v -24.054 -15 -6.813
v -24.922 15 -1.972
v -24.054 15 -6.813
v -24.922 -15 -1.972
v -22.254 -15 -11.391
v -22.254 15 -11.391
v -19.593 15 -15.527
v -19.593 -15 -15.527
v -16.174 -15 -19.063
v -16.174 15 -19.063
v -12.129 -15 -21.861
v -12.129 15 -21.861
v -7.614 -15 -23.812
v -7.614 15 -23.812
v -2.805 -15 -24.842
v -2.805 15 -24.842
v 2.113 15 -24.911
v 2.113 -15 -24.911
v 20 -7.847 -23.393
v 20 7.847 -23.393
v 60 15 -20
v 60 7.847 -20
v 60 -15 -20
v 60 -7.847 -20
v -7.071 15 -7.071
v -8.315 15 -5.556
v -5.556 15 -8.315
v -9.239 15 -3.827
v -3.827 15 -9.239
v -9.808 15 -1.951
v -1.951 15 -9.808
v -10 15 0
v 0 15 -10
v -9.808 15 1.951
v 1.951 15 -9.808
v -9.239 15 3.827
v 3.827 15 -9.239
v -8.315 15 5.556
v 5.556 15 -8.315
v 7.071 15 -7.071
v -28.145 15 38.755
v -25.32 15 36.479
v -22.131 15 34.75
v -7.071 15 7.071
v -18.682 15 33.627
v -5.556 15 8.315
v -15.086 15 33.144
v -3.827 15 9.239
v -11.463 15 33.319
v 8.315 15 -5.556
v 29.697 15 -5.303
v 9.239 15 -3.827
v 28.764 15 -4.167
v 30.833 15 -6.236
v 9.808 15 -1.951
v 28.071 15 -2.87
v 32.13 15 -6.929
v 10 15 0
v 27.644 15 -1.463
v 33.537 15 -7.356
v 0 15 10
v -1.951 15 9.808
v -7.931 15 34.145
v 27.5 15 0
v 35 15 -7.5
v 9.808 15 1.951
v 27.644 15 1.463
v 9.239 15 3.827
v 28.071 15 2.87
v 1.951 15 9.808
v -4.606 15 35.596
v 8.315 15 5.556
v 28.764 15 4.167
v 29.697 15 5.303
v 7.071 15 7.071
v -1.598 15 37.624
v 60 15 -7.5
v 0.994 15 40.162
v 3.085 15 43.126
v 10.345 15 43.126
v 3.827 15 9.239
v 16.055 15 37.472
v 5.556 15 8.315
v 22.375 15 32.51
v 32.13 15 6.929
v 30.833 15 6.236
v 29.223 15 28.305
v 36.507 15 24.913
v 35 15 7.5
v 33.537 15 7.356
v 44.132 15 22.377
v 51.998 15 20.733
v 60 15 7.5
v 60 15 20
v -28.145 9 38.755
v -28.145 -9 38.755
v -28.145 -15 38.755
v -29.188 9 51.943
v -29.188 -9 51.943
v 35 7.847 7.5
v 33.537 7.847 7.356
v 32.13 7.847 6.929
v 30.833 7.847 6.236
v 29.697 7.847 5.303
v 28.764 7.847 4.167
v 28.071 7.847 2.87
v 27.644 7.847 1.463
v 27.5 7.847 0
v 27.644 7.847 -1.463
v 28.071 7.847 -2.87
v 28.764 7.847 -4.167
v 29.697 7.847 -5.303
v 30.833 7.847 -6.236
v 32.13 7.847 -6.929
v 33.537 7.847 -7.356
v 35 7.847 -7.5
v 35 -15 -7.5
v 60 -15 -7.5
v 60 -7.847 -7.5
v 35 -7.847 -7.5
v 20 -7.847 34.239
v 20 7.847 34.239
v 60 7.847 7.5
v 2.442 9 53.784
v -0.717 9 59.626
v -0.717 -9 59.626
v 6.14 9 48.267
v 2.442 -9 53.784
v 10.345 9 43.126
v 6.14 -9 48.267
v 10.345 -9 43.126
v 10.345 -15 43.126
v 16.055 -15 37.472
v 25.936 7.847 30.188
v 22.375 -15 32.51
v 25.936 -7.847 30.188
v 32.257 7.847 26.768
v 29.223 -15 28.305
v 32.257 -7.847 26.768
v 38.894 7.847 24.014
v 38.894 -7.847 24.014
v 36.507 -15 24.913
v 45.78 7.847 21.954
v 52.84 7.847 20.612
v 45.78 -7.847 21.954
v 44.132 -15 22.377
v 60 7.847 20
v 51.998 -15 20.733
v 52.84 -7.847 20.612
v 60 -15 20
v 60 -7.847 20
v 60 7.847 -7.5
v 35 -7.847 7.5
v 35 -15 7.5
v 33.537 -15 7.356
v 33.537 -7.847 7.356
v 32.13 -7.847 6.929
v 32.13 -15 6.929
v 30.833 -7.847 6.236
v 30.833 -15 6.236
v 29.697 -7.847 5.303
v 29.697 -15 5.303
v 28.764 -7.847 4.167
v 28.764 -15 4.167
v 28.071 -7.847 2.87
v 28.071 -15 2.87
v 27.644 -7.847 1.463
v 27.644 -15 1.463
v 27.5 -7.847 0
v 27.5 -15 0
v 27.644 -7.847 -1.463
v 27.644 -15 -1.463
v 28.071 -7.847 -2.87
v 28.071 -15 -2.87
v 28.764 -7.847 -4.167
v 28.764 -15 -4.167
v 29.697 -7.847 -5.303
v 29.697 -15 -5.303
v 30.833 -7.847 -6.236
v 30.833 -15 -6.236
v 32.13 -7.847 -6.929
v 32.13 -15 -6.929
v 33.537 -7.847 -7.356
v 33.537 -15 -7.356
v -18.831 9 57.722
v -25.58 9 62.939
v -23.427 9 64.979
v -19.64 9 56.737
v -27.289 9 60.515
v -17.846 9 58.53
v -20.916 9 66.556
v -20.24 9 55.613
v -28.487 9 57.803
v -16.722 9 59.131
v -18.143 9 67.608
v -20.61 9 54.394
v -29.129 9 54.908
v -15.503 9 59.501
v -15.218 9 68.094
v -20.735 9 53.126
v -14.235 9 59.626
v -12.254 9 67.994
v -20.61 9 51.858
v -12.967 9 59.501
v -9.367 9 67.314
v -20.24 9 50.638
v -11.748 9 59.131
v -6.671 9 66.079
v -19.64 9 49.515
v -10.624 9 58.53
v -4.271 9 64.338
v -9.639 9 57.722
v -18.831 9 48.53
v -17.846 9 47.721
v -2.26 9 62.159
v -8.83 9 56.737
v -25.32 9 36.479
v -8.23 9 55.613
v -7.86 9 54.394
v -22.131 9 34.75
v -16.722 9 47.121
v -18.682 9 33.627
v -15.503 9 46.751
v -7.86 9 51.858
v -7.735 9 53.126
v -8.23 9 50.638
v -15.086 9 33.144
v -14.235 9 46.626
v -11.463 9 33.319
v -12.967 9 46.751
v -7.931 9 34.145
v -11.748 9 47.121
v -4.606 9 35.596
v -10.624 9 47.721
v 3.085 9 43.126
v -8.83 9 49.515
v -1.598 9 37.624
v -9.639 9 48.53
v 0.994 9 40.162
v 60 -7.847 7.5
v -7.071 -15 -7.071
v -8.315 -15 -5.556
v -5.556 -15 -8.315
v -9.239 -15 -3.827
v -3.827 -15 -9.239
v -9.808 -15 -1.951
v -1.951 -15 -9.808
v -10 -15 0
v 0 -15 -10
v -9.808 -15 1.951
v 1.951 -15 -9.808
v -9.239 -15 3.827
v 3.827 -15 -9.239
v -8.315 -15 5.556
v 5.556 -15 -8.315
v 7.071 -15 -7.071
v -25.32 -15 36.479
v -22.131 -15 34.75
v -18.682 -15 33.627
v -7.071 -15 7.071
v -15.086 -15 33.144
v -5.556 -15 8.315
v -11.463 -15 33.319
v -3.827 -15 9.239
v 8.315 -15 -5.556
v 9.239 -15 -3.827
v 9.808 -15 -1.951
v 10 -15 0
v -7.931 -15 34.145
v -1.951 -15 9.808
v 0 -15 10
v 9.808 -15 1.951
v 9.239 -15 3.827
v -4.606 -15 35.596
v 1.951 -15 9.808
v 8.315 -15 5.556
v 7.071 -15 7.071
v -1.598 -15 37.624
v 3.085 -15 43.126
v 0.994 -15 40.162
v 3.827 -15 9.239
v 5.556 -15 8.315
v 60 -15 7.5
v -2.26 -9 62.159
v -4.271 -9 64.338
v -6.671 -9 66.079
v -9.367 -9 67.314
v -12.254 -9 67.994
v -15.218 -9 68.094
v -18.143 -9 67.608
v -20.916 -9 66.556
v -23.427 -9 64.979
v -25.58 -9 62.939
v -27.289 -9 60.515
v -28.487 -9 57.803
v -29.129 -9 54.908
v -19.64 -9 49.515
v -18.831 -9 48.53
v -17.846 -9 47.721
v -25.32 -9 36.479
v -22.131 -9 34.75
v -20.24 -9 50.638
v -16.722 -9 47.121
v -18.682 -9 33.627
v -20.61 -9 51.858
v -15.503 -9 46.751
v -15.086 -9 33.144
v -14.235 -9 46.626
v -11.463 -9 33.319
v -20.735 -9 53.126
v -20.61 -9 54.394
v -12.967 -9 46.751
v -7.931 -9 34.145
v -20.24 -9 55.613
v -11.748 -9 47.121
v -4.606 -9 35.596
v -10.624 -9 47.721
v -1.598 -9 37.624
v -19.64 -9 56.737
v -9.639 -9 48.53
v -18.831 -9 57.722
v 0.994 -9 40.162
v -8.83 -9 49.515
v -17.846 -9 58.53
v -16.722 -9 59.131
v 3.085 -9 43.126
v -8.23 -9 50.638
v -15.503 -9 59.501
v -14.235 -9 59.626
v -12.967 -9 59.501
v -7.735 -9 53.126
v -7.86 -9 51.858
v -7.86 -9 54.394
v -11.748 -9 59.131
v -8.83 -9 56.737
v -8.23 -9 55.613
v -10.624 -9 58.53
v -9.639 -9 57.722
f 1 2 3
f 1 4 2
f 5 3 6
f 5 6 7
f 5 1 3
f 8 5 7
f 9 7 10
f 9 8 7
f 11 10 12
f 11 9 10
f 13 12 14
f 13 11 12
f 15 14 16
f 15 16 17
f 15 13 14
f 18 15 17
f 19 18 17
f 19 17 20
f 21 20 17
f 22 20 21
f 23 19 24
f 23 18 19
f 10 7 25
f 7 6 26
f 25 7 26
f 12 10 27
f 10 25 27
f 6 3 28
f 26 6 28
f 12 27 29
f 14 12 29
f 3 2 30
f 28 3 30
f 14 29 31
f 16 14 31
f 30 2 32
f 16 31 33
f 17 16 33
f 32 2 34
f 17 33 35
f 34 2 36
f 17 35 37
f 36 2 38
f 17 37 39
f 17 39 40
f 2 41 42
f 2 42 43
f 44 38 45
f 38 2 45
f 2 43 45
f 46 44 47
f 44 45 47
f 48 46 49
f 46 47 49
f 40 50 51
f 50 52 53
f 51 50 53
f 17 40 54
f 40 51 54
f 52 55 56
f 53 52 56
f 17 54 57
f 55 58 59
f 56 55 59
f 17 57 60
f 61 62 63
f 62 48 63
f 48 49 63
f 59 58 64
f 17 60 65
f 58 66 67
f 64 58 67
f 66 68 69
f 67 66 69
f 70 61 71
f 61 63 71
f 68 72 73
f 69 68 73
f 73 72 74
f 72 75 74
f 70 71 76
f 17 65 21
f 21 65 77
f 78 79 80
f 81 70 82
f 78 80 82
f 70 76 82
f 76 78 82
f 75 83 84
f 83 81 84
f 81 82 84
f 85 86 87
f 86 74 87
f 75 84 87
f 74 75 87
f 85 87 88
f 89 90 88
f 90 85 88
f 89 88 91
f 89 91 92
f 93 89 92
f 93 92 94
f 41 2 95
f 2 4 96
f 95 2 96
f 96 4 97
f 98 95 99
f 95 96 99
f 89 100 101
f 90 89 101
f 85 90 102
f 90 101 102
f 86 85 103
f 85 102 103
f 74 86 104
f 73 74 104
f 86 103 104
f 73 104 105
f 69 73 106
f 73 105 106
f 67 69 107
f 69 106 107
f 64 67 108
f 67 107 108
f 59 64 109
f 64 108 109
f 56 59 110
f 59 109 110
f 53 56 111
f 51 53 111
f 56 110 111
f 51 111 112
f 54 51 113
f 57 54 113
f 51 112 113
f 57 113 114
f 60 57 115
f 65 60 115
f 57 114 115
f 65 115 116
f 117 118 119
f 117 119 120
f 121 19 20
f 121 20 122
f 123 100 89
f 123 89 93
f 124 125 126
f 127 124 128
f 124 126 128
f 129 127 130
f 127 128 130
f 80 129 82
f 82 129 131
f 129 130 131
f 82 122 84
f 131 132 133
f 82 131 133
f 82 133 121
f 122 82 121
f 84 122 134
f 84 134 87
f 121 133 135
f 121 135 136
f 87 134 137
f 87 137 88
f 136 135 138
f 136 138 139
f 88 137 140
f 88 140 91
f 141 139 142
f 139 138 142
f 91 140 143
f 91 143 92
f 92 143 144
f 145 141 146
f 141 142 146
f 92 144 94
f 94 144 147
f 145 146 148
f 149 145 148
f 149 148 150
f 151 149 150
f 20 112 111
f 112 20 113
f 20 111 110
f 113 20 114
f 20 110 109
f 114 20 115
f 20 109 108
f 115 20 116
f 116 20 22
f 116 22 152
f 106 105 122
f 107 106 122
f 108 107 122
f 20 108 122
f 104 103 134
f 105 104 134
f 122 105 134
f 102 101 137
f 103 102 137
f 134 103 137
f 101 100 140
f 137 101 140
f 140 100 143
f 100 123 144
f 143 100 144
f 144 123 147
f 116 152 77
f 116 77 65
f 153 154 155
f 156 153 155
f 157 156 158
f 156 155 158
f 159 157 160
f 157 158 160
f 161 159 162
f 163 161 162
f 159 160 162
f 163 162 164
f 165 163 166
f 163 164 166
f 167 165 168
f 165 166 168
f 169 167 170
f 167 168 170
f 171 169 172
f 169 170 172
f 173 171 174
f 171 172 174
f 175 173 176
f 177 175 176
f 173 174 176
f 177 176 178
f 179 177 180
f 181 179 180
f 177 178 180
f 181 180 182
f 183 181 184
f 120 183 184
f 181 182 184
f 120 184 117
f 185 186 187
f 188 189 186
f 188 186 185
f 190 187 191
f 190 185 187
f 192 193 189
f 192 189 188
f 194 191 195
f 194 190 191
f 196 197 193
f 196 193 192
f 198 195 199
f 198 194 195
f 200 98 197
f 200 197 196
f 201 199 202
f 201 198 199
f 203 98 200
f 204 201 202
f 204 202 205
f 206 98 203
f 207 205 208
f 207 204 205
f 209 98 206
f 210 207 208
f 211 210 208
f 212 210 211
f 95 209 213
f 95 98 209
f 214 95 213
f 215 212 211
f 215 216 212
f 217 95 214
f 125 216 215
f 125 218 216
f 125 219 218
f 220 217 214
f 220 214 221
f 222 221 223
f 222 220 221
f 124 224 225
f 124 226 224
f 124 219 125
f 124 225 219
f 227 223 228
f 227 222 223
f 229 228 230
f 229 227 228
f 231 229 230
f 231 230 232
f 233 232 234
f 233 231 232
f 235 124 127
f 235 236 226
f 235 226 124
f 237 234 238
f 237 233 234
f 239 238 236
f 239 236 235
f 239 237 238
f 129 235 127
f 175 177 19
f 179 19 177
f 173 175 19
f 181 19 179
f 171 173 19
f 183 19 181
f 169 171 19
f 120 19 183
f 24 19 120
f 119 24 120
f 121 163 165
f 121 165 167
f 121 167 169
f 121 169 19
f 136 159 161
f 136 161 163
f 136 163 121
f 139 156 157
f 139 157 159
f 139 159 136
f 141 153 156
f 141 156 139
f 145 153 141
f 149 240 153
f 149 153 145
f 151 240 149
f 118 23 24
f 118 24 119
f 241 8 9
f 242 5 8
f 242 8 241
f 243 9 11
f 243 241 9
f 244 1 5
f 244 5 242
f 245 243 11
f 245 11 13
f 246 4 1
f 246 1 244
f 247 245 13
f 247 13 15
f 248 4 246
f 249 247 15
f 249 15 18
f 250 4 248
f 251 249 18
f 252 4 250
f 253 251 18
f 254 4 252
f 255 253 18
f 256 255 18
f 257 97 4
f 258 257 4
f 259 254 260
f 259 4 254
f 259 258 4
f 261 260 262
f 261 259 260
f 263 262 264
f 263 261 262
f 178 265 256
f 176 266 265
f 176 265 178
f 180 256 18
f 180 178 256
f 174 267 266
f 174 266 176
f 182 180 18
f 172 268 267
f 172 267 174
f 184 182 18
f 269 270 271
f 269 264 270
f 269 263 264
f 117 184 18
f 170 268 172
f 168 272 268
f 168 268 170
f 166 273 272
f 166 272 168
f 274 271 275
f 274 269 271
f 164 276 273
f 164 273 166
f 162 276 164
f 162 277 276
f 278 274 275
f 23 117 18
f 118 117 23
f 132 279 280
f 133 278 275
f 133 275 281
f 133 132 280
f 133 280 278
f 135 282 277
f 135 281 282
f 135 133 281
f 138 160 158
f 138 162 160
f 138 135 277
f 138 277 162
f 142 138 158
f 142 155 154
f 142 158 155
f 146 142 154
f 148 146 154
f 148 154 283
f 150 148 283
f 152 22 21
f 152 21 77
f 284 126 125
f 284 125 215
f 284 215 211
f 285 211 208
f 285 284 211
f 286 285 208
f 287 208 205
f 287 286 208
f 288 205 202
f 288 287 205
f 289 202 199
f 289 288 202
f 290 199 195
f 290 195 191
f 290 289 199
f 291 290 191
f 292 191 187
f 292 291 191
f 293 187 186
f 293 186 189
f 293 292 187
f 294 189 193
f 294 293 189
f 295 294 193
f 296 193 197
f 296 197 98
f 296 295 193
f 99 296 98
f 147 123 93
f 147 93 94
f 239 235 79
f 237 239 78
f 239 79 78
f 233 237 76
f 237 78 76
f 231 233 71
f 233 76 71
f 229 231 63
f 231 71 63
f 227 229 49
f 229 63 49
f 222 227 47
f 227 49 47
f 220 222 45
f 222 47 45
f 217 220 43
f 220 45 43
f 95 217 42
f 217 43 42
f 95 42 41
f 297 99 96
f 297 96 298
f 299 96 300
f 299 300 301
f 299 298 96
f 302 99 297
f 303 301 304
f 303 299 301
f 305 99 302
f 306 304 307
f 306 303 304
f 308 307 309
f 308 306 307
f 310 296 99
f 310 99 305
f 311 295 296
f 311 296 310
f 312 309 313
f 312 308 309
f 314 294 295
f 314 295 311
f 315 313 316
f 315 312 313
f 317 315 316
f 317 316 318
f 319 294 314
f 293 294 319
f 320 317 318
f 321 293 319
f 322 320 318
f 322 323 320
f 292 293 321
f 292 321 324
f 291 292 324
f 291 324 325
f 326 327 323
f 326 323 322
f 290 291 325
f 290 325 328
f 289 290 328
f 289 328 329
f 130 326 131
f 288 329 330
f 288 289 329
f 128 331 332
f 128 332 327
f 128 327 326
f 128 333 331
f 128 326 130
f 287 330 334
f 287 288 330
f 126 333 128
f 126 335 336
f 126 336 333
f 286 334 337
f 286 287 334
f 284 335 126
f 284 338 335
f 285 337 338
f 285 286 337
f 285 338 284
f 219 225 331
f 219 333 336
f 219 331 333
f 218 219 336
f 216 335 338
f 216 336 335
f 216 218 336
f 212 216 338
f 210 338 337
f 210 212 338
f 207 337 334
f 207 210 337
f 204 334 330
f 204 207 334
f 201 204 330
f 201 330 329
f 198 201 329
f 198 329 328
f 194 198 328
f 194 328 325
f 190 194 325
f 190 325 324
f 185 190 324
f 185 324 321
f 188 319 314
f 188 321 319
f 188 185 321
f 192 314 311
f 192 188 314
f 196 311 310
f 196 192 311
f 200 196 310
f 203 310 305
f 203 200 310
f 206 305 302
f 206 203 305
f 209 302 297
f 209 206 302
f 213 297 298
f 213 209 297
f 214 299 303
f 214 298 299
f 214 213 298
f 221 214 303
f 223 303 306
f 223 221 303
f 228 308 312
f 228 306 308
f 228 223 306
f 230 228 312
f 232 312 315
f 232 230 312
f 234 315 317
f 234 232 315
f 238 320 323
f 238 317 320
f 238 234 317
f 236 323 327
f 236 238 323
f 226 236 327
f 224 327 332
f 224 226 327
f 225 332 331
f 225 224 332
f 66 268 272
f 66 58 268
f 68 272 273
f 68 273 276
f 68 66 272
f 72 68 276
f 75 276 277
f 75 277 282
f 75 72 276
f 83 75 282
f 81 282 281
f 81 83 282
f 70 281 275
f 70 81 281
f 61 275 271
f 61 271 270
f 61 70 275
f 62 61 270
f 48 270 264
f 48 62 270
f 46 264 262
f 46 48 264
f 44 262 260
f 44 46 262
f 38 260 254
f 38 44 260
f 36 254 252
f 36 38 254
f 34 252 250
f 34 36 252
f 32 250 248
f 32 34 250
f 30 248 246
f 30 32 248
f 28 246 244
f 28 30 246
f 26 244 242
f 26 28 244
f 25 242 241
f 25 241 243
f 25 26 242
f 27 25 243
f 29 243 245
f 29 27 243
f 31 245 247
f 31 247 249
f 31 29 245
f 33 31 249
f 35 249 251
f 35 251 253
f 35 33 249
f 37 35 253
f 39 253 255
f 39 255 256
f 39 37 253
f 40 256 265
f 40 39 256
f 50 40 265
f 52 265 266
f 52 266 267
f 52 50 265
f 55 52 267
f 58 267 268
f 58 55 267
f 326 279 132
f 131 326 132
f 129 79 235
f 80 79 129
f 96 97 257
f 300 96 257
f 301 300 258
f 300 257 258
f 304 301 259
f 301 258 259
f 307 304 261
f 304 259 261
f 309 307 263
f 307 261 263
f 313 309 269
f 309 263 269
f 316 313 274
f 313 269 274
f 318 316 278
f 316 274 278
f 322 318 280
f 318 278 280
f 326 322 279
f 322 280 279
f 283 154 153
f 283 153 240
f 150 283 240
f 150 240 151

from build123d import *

# Parameters (mm, degrees)
SKETCH_R        = 10
SKETCH_R_2      = 6.5
PAD_DEPTH       = 15
SKETCH001_R     = 20
POCKET_DEPTH    = 6
SKETCH002_R     = 20
POCKET001_DEPTH = 6
SKETCH003_W     = 105.189392
SKETCH003_H     = 15.694074
POCKET002_DEPTH = 40
SKETCH004_W     = 18.945393
SKETCH004_H     = 8.112743
POCKET003_DEPTH = 6
SKETCH005_W     = 34.537269
SKETCH005_H     = 10.152644
POCKET004_DEPTH = 6


with BuildPart() as part:
    # Sketch → Pad (new body, symmetric)
    with BuildSketch(Plane.XZ):
        with BuildLine():
            ThreePointArc((-24.922099, -1.972055), (-16.174238, -19.062897), (2.11311, -24.910535))
            Line((2.11311, -24.910535), (60, -20))
            Line((60, -20), (60, -7.5))
            Line((60, -7.5), (35, -7.5))
            ThreePointArc((35, 7.5), (27.5, 0), (35, -7.5))
            Line((35, 7.5), (60, 7.5))
            Line((60, 7.5), (60, 20))
            ThreePointArc((-0.716595, 59.626032), (24.111636, 31.339626), (60, 20))
            ThreePointArc((-0.716595, 59.626032), (-18.14313, 67.607871), (-29.188307, 51.942687))
            Line((-24.922099, -1.972055), (-29.188307, 51.942687))
        make_face()
        Circle(SKETCH_R, mode=Mode.SUBTRACT)
        with Locations((-14.235047, 53.12592)):
            Circle(SKETCH_R_2, mode=Mode.SUBTRACT)
    extrude(amount=PAD_DEPTH, both=True)

    # Sketch001 → Pocket (cut)
    with BuildSketch(Plane.XZ.offset(15)):
        with Locations((-14.235047, 53.12592)):
            Circle(SKETCH001_R)
    extrude(amount=-POCKET_DEPTH, mode=Mode.SUBTRACT)

    # Sketch002 → Pocket001 (cut)
    with BuildSketch(Plane(origin=(0, 15, 0), x_dir=(1, 0, 0), z_dir=(0, 1, 0))):
        with Locations((-14.235047, -53.12592)):
            Circle(SKETCH002_R)
    extrude(amount=-POCKET001_DEPTH, mode=Mode.SUBTRACT)

    # Sketch003 → Pocket002 (cut)
    with BuildSketch(Plane(origin=(60, 0, 0), x_dir=(0, 0, 1), z_dir=(1, 0, 0))):
        with Locations((20.110367, 0)):
            Rectangle(SKETCH003_W, SKETCH003_H)
    extrude(amount=-POCKET002_DEPTH, mode=Mode.SUBTRACT)

    # Sketch004 → Pocket003 (cut)
    with BuildSketch(Plane.XZ.offset(15)):
        with Locations((5.87438, 47.182291)):
            Rectangle(SKETCH004_W, SKETCH004_H)
    extrude(amount=-POCKET003_DEPTH, mode=Mode.SUBTRACT)

    # Sketch005 → Pocket004 (cut)
    with BuildSketch(Plane(origin=(0, 15, 0), x_dir=(1, 0, 0), z_dir=(0, 1, 0))):
        with Locations((9.807045, -48.202242)):
            Rectangle(SKETCH005_W, SKETCH005_H)
    extrude(amount=-POCKET004_DEPTH, mode=Mode.SUBTRACT)


solid = part.part
